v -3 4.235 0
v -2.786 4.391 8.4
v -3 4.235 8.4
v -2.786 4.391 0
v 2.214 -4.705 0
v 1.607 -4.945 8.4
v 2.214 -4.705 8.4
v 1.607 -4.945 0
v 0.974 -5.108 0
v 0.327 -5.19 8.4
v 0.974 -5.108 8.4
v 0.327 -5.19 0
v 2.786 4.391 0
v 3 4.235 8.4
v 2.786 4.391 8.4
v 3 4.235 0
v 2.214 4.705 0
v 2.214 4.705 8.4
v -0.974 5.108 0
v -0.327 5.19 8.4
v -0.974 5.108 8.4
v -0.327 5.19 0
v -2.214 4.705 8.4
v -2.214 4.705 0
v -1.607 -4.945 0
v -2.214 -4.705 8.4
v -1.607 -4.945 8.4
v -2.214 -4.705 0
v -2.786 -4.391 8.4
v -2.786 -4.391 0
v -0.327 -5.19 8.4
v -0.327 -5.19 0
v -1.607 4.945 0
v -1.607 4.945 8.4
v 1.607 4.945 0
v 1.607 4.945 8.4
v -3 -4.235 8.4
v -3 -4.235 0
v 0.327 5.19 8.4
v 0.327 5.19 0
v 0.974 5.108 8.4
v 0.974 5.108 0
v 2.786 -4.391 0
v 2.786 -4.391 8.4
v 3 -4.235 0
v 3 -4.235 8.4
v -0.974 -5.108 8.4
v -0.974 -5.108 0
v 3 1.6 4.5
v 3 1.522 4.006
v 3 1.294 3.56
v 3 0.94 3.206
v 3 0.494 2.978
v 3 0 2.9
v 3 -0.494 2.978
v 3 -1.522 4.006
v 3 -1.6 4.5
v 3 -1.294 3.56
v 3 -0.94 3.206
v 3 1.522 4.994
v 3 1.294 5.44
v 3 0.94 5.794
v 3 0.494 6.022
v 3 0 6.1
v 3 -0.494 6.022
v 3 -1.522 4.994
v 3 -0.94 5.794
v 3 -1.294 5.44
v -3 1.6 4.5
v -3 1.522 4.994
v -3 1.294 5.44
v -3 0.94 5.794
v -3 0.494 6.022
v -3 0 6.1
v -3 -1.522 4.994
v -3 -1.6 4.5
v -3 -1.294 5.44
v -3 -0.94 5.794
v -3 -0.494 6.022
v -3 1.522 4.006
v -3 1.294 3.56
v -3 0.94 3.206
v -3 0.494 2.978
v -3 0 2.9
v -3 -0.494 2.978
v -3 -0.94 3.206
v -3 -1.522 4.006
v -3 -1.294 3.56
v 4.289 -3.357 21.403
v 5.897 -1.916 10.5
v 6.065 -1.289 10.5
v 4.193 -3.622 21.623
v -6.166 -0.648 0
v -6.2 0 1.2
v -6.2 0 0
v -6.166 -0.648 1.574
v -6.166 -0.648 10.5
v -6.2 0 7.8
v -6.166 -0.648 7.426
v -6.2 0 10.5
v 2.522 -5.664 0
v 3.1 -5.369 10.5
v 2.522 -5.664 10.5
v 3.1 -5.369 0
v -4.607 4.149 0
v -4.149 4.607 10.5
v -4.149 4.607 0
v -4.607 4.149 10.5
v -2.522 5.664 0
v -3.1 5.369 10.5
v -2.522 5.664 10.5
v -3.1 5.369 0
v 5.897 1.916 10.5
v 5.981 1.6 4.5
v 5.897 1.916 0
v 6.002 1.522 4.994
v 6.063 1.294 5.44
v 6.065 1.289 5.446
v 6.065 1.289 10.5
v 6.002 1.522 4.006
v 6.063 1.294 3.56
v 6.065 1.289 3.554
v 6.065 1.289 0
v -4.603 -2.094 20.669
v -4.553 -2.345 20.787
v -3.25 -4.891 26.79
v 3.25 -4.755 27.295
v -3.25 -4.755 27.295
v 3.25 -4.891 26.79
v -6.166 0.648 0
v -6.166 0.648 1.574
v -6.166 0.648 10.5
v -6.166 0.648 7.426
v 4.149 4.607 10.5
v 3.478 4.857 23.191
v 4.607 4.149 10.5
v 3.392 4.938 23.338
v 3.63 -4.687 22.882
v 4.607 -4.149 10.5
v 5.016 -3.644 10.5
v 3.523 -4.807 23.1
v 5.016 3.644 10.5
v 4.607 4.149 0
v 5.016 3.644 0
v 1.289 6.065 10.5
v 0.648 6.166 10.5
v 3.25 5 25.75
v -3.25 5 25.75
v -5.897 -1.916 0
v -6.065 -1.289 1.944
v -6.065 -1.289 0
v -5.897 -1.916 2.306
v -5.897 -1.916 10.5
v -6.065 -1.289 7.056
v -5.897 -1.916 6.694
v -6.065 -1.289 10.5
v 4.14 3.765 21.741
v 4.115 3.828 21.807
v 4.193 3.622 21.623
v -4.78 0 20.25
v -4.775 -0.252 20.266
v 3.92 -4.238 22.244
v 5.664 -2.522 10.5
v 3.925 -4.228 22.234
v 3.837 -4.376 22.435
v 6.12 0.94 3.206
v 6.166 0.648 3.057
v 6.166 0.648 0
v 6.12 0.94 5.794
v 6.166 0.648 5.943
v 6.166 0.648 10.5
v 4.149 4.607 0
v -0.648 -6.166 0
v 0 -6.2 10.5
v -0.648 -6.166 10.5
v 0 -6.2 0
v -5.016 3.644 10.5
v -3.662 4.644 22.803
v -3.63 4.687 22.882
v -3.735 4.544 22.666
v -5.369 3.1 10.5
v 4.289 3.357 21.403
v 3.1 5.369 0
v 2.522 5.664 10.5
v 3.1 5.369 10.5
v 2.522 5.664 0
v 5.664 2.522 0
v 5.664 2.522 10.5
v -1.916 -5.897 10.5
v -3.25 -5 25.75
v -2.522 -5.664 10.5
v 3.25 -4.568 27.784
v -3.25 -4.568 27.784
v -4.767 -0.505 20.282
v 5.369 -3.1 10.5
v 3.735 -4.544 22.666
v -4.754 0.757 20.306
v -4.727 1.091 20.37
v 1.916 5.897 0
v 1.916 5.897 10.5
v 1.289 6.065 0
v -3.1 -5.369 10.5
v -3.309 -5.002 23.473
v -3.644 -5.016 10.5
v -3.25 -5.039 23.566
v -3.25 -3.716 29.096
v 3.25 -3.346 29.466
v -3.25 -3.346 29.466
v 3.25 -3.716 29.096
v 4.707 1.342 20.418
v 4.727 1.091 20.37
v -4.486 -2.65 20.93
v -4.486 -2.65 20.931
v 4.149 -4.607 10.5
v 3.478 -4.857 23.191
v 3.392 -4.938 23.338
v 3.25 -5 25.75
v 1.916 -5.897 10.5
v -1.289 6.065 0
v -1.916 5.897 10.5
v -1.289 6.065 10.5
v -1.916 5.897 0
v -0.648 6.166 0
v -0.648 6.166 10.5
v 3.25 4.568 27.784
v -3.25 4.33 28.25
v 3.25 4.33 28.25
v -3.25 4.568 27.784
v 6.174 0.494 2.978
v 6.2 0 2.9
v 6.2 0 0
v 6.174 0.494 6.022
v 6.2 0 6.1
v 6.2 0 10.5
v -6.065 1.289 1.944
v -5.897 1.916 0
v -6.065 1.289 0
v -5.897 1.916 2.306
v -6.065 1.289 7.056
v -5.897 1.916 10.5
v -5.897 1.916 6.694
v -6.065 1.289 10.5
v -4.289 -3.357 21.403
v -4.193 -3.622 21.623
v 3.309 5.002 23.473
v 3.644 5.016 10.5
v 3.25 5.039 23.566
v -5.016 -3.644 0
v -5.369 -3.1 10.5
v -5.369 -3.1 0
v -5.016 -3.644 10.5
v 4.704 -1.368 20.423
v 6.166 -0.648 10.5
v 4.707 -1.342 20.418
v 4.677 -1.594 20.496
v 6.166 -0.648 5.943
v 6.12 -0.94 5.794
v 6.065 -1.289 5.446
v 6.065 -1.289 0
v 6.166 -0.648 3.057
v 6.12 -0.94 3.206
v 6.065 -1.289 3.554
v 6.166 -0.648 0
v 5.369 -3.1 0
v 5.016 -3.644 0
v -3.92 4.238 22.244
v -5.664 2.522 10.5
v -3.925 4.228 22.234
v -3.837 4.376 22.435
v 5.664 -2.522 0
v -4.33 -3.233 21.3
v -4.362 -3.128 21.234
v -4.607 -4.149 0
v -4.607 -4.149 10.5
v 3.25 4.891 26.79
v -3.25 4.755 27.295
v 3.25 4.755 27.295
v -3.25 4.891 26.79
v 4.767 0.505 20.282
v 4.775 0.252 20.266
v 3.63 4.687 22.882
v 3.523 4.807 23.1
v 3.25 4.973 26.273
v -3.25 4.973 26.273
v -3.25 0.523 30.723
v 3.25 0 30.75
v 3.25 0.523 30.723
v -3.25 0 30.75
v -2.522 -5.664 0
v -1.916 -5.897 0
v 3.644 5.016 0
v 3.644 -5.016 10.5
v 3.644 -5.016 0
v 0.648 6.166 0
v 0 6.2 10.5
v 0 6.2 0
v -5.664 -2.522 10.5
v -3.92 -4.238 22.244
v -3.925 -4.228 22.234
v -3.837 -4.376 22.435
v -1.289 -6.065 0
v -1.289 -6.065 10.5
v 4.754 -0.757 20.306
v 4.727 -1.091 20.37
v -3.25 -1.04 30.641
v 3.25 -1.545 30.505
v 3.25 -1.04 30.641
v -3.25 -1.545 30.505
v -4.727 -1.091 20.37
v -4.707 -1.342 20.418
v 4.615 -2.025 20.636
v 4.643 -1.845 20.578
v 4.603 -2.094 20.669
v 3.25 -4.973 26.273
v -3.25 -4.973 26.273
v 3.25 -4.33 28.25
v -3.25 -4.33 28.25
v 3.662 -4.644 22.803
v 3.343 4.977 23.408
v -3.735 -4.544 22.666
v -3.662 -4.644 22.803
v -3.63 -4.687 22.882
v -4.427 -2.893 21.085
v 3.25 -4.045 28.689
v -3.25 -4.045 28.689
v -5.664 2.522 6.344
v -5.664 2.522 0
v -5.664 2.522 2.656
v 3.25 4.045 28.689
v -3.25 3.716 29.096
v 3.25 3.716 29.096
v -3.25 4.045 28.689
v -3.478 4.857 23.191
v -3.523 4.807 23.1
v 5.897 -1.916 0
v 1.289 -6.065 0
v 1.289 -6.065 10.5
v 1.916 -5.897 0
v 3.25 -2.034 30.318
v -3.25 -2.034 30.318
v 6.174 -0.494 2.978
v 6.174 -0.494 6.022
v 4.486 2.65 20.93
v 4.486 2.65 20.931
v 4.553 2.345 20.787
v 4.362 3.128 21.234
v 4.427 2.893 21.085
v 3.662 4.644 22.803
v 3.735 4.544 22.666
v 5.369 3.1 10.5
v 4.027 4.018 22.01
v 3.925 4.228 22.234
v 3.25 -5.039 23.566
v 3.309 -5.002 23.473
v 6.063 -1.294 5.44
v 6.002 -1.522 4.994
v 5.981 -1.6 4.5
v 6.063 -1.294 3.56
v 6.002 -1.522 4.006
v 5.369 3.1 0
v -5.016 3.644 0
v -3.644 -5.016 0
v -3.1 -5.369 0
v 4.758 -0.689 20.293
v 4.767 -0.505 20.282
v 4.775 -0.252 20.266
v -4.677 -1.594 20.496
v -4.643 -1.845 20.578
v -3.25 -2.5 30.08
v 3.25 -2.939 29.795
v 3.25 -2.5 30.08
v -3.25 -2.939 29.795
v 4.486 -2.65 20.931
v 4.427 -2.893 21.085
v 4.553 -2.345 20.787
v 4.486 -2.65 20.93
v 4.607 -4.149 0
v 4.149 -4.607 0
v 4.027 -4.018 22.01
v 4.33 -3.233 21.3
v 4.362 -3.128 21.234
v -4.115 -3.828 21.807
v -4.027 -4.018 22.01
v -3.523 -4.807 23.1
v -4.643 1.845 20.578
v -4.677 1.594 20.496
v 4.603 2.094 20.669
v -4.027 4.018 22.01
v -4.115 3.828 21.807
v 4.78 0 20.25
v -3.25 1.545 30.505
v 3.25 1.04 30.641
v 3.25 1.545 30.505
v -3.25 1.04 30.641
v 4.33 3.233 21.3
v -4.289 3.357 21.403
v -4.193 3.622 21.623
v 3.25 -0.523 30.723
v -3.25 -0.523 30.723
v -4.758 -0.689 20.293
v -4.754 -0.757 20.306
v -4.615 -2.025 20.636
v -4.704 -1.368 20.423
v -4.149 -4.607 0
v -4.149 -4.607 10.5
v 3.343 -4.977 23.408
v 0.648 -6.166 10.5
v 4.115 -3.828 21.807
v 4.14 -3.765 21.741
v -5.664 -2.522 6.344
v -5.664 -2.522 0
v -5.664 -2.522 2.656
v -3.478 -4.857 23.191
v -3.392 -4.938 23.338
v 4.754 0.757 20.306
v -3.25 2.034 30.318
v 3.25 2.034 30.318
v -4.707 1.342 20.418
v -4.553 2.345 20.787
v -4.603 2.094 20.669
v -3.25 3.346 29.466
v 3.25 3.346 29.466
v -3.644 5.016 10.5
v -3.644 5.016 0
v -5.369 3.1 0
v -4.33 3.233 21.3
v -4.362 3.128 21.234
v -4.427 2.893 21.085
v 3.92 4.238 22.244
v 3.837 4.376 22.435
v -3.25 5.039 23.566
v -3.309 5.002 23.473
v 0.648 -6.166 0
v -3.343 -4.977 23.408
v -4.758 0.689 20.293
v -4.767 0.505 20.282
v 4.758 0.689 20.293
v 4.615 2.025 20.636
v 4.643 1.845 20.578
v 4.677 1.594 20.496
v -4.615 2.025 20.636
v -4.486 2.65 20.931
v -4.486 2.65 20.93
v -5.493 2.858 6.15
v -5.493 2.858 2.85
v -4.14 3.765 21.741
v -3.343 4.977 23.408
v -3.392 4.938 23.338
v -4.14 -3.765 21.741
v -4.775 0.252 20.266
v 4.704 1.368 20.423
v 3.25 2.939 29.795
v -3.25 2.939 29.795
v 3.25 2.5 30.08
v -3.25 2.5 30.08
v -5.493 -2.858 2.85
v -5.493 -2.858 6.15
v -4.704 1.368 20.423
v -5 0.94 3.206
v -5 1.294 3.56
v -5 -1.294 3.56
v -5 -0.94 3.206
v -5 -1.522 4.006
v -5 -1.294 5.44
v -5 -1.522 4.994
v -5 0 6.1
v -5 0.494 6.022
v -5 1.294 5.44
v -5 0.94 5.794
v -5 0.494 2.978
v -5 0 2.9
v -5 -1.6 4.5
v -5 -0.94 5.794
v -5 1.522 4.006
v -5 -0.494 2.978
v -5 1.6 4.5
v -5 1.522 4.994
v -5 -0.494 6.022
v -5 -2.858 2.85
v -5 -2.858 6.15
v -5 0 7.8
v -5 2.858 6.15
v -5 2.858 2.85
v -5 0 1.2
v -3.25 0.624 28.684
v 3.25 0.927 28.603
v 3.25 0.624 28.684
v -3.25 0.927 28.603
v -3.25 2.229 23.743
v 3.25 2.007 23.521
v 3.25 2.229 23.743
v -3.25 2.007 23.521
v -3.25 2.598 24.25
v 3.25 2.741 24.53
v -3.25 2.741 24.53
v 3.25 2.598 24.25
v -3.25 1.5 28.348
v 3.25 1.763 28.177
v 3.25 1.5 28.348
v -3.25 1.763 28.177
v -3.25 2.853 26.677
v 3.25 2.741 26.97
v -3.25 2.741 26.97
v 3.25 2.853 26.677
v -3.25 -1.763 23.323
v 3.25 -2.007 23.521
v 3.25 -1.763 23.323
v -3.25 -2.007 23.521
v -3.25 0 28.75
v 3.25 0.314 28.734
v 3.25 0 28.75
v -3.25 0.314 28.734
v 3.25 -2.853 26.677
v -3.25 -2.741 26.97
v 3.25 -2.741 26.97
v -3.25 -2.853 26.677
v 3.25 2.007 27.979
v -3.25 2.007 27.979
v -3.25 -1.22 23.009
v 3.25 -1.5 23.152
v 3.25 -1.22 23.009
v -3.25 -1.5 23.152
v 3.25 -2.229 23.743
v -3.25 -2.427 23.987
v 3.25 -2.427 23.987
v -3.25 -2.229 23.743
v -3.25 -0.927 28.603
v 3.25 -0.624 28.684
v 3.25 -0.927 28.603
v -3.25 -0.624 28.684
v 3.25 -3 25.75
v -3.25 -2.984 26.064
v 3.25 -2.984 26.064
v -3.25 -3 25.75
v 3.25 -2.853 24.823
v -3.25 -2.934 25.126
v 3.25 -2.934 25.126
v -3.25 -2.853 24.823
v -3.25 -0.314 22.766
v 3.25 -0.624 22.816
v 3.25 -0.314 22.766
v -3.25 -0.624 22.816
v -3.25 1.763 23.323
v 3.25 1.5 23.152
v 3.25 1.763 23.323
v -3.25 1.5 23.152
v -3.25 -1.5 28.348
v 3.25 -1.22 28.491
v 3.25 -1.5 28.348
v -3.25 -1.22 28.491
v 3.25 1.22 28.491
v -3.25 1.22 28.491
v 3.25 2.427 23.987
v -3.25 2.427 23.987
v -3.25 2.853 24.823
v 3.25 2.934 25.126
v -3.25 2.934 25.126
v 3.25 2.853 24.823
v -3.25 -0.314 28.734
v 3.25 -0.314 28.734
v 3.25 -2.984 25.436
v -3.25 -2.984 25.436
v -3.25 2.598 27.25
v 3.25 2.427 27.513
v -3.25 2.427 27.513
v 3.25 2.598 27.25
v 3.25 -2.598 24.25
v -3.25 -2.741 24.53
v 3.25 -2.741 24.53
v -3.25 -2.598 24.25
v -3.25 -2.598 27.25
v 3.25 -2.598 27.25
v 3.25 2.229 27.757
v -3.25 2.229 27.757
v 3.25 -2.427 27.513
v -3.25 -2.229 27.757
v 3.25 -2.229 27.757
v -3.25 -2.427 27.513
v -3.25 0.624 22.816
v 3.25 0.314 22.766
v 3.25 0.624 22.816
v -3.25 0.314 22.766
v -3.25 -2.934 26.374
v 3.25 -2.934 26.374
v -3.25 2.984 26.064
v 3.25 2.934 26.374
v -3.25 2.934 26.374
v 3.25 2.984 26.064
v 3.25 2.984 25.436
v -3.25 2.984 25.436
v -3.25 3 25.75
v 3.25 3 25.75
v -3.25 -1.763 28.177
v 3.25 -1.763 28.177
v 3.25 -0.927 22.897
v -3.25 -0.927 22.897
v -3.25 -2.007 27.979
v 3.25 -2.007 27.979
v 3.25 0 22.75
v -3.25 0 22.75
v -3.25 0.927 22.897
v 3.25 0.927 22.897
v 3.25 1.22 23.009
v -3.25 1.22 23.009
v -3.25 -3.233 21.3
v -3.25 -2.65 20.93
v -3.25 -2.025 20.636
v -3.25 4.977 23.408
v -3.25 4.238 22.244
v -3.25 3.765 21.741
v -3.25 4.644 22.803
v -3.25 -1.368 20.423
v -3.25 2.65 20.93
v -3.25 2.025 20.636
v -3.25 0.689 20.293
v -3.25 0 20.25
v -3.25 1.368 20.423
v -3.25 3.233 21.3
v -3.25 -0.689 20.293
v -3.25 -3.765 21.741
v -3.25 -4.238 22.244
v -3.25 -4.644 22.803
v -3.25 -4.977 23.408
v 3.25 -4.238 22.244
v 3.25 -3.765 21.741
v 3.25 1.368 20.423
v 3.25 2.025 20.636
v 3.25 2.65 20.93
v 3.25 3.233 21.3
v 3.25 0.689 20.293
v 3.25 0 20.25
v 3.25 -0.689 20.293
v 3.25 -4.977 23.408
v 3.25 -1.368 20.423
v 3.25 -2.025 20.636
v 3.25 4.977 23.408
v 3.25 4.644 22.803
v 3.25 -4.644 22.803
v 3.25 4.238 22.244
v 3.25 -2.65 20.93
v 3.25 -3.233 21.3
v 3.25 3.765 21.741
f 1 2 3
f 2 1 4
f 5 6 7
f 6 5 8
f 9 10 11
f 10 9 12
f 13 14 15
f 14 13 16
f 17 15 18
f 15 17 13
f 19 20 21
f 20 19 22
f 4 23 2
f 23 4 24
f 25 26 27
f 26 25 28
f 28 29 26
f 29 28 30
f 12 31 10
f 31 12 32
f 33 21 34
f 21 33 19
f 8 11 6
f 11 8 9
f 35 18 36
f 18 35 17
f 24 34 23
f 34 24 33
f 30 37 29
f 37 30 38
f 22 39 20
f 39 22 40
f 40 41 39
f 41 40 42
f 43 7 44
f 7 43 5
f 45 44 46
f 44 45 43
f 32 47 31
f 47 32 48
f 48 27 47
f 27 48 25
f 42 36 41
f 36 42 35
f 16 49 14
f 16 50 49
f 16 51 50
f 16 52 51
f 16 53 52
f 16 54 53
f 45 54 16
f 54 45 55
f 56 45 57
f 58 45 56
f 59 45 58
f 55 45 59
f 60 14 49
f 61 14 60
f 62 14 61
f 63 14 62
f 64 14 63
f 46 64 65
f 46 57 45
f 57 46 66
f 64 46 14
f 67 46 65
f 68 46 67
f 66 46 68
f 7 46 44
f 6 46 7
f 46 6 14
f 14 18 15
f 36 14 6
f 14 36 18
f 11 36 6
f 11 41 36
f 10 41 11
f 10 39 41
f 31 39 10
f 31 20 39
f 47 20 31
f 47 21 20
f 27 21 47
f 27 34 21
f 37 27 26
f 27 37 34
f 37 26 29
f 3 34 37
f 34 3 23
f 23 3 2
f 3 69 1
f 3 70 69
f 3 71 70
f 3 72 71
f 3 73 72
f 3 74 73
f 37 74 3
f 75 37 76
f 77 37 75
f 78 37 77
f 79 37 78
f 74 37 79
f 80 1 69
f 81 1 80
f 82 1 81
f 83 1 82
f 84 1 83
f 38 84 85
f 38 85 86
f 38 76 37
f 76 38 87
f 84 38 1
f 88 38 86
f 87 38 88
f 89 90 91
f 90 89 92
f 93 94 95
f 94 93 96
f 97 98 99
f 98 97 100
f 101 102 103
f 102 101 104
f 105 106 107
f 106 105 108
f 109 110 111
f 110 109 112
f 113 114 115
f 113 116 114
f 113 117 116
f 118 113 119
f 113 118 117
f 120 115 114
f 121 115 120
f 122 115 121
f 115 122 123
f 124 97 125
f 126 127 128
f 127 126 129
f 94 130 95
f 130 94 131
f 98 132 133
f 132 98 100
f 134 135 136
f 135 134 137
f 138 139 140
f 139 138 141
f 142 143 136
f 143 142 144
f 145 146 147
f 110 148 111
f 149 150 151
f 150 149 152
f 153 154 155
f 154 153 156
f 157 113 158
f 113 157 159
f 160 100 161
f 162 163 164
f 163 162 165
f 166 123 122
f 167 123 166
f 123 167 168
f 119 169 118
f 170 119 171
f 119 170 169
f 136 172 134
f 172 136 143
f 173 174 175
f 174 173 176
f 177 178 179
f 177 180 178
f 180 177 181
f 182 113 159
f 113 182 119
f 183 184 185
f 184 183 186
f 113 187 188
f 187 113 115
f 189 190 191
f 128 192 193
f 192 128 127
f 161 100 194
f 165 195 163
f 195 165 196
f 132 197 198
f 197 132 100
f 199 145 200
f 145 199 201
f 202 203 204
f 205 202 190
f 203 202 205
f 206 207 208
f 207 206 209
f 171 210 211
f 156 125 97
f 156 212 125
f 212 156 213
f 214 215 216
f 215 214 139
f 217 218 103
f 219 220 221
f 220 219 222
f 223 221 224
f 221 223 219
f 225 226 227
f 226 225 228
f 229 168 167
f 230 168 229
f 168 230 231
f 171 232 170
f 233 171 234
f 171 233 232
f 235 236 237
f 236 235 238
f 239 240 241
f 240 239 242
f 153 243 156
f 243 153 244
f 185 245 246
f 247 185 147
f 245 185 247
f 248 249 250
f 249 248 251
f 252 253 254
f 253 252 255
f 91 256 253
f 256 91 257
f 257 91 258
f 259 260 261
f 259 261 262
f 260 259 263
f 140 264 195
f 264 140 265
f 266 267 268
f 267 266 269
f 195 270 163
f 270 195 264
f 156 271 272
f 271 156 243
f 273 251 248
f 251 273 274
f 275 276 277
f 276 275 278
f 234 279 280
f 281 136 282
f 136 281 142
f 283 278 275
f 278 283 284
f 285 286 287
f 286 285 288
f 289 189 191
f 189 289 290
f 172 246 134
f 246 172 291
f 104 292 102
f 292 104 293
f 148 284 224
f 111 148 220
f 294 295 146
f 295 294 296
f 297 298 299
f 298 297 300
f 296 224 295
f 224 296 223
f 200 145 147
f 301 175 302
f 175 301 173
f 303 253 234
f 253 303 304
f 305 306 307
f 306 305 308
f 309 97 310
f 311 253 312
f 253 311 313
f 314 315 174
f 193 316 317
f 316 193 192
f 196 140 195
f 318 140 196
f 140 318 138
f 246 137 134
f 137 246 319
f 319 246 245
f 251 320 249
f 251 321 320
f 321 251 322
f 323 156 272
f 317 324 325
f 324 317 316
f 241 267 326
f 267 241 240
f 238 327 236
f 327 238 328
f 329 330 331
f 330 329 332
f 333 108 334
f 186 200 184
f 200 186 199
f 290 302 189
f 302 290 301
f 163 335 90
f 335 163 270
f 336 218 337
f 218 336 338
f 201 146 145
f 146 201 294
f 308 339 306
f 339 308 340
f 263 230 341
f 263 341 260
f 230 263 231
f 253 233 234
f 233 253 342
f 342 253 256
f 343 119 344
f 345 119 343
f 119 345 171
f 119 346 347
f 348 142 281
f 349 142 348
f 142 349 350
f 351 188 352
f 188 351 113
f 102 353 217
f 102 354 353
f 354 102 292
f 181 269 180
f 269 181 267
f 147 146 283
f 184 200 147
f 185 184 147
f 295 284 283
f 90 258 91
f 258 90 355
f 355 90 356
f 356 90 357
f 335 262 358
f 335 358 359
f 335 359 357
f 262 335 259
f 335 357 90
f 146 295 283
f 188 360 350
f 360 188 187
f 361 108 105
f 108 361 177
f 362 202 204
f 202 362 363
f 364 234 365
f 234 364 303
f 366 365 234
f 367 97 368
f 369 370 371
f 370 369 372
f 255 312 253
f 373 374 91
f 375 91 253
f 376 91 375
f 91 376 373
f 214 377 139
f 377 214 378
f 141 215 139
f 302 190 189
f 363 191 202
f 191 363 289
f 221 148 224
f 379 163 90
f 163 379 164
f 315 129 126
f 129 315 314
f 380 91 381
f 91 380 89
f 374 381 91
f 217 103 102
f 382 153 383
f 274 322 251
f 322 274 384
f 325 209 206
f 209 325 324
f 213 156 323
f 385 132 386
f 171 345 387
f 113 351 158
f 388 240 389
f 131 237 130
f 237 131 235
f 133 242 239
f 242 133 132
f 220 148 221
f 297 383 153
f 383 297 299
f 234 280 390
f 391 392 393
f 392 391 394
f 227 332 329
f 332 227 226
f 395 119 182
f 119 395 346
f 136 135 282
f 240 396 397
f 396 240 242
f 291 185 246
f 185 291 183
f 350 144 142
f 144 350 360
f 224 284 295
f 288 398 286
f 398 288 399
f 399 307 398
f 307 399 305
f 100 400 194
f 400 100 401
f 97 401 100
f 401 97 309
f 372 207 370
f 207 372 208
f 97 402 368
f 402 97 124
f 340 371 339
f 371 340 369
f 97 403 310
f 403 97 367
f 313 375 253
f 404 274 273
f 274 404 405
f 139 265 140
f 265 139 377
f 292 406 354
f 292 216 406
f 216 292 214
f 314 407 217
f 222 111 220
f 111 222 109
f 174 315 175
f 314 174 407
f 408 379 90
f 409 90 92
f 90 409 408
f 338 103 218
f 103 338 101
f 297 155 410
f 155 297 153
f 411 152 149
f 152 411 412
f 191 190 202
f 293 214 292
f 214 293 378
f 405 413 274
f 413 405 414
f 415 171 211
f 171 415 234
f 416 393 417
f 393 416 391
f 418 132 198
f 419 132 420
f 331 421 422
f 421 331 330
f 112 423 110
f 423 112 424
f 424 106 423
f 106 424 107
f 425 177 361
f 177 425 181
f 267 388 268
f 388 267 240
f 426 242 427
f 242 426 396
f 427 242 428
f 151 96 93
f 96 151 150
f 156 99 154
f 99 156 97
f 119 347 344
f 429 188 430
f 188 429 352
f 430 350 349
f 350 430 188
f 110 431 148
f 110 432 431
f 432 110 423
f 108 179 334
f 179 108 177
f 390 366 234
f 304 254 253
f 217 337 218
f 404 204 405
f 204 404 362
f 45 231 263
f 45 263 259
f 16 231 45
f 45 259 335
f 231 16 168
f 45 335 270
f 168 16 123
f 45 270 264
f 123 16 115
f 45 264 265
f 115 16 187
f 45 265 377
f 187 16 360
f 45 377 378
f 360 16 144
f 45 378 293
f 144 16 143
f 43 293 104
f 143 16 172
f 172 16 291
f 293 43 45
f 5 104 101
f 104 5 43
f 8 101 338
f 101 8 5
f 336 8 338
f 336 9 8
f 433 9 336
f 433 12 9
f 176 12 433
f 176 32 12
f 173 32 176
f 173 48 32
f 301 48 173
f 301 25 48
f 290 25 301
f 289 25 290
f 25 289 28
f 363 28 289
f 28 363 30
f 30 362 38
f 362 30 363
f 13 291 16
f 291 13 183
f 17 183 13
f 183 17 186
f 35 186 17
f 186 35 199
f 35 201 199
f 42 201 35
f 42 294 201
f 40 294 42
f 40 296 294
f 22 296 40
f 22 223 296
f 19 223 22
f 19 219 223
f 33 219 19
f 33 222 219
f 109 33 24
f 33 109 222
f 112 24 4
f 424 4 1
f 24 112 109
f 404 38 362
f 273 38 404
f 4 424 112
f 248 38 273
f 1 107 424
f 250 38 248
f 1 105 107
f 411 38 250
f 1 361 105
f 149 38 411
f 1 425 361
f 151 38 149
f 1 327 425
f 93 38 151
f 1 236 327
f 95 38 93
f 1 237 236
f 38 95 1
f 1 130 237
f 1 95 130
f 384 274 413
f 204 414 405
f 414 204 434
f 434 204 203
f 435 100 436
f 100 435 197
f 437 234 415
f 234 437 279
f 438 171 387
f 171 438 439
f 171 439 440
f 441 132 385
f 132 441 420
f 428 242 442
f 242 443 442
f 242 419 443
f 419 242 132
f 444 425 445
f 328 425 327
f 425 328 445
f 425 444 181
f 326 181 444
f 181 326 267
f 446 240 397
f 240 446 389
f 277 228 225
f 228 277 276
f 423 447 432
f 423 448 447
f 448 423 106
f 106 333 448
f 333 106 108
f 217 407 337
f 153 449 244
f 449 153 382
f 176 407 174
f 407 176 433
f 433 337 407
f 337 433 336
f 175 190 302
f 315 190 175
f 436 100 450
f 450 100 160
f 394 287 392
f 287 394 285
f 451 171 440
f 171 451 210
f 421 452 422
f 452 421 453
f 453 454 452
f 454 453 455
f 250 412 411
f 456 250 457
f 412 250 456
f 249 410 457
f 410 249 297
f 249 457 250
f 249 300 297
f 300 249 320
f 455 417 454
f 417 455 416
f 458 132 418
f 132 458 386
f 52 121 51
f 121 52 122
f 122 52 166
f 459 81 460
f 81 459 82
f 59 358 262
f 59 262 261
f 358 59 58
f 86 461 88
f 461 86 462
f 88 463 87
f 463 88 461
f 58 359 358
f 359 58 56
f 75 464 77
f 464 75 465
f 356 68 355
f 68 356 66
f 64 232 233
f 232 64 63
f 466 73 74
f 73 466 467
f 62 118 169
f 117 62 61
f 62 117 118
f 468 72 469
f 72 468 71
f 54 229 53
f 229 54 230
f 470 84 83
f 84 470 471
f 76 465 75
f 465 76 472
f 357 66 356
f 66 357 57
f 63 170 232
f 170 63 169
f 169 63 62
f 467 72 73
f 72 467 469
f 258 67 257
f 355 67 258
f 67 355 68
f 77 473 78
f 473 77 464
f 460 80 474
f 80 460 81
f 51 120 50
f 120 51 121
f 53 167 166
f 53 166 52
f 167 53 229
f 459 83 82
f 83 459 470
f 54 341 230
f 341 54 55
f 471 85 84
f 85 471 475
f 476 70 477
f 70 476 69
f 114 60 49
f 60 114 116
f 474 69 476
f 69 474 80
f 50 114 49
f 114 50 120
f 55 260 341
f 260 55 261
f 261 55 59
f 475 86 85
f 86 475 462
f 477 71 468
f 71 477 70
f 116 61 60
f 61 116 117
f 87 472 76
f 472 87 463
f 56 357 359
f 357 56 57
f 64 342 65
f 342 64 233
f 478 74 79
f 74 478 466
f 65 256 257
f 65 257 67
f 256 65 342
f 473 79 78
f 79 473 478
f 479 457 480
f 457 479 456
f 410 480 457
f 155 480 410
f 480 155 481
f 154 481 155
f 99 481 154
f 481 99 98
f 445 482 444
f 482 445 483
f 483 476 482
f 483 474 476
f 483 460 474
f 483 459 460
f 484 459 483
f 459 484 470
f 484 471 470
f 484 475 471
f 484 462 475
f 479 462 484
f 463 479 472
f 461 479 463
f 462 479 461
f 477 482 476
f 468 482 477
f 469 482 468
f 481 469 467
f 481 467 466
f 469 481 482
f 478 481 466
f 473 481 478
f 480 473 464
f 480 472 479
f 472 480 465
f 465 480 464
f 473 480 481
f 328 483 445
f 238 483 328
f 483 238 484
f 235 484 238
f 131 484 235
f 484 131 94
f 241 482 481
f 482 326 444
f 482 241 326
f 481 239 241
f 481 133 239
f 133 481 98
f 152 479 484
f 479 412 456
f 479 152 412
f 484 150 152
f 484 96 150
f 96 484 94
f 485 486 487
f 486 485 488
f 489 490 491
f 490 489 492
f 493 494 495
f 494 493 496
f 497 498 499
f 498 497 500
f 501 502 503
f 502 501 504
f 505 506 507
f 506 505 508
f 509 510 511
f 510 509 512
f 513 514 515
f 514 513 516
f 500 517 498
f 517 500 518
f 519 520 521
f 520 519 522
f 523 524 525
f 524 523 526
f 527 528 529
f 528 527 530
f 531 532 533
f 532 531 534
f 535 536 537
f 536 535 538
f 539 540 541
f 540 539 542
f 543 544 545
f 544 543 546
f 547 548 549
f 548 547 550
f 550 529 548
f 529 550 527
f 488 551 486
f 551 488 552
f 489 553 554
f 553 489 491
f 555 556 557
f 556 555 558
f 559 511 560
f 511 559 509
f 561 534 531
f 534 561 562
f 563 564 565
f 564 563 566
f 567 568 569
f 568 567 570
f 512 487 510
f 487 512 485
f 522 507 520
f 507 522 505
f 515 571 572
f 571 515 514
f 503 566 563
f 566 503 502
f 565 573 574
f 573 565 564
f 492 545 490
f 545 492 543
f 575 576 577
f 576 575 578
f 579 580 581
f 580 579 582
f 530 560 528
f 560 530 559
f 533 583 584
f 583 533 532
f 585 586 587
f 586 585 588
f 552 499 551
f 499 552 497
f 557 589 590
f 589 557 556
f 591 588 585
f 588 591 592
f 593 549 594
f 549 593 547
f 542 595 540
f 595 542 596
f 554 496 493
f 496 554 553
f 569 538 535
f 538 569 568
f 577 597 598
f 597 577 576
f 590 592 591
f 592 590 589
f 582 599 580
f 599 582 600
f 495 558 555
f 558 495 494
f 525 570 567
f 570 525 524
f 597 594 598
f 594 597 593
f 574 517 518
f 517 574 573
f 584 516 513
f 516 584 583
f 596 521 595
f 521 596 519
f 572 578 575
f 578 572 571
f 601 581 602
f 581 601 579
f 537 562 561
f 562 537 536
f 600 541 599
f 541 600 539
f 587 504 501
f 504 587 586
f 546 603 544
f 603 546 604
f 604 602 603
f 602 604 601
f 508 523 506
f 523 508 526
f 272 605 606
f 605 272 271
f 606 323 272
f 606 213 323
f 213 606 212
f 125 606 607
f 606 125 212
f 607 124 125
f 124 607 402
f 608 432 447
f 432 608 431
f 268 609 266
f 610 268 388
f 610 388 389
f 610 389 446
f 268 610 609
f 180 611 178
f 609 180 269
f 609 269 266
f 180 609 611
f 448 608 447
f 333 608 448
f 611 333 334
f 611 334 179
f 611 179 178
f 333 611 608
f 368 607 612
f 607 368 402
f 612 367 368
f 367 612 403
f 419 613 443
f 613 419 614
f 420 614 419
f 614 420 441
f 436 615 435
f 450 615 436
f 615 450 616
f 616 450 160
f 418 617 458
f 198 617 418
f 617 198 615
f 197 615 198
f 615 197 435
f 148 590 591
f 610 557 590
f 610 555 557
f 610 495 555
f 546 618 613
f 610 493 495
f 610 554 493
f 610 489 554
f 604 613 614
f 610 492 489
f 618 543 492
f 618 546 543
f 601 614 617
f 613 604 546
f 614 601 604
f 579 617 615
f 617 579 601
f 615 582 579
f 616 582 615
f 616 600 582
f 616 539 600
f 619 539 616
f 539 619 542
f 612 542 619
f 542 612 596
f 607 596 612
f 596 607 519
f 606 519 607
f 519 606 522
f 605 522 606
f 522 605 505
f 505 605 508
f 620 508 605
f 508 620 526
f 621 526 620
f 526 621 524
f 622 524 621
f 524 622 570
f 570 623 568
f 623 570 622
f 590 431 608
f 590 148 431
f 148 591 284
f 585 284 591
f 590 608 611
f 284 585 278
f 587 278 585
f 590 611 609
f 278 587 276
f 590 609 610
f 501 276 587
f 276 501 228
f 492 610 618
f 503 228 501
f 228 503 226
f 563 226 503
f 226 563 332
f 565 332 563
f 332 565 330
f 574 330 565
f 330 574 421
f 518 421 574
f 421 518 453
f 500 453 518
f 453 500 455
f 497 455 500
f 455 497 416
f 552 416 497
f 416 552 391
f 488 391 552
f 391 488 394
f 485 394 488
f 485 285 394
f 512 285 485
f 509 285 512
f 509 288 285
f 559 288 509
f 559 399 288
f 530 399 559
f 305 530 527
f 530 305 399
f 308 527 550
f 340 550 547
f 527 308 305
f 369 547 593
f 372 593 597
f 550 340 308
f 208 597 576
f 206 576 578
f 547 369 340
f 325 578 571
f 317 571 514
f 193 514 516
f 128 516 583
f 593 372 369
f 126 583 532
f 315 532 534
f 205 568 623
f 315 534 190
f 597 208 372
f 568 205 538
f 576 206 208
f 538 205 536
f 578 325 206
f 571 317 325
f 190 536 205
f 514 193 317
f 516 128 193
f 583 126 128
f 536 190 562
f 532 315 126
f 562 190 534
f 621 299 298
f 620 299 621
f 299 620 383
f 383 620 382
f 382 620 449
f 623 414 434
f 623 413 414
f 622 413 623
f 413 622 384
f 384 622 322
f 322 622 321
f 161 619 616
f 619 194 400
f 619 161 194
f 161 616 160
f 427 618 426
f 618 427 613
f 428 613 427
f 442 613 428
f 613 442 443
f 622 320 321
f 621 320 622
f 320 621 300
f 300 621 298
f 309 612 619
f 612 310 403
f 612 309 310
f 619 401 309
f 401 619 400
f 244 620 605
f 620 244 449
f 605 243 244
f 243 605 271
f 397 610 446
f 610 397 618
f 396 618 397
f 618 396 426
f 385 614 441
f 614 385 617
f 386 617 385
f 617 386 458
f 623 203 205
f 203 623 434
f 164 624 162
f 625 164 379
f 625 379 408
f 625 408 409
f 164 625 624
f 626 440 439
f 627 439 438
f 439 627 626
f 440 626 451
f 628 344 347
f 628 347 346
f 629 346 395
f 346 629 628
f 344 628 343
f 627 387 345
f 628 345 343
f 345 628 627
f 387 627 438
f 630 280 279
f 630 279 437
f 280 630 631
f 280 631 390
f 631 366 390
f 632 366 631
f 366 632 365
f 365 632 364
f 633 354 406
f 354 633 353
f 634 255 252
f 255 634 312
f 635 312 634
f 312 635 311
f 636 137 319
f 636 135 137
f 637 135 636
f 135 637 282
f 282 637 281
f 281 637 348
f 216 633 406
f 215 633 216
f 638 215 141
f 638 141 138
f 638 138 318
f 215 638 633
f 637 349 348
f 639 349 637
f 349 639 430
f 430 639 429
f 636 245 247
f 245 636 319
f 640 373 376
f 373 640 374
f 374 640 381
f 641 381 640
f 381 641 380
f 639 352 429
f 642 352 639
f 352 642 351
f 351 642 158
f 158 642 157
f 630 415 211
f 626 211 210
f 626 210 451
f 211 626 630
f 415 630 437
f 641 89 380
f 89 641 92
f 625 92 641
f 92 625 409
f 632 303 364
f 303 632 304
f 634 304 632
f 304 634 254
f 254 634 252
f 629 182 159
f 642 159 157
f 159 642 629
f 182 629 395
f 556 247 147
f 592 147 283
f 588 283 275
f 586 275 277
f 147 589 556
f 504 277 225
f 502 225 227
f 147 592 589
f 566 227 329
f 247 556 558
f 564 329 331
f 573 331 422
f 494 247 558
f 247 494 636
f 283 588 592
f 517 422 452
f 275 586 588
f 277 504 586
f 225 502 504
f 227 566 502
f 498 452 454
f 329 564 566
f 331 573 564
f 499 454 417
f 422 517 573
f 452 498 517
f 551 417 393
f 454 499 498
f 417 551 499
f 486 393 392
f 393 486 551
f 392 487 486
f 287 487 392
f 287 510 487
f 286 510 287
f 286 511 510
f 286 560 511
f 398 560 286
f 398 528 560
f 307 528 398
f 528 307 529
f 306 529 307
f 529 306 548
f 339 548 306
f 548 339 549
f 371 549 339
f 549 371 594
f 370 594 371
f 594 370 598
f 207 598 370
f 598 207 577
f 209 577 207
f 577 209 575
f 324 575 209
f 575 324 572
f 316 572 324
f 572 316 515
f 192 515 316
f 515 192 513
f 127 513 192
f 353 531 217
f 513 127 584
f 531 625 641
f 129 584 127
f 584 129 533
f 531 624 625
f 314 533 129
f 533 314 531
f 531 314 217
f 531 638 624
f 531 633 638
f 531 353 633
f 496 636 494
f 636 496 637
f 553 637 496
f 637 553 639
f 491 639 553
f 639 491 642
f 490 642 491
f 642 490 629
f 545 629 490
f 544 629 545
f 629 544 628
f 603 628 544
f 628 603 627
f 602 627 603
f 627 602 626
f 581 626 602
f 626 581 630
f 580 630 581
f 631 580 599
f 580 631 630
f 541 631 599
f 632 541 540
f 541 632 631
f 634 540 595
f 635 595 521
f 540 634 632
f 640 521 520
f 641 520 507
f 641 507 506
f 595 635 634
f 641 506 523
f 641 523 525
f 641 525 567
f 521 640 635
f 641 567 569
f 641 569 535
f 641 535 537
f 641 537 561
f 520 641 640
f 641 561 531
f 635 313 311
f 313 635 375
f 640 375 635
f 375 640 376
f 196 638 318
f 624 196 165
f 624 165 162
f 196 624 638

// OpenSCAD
// file: lib/igus.scad
include <../../parameters.scad>


module efsm_04(){
    import("../../STL/external/igus/EFSM_04.stl", convexity = 5);
}
module efsm_05(){
    import("../../STL/external/igus/EFSM_05.stl", convexity = 5);
}
module efsm_06(){
    import("../../STL/external/igus/EFSM_06.stl", convexity = 5);
}
module efsm_08(){
    import("../../STL/external/igus/EFSM_08.stl", convexity = 5);
}
module efsm_10(){
    import("../../STL/external/igus/EFSM_10.stl", convexity = 5);
}
module efsm_12(){
    import("../../STL/external/igus/EFSM_12.stl", convexity = 5);
}





module kstm_05(){
    import("../../STL/external/igus/KSTM_05_1.stl", convexity = 5);
}
module kstm_06(){
    import("../../STL/external/igus/KSTM_06_2.stl", convexity = 5);
}
module kstm_08(){
    import("../../STL/external/igus/KSTM_08_3.stl", convexity = 5);
}
module kstm_10(){
    import("../../STL/external/igus/KSTM_10_4.stl", convexity = 5);
}


data_kstm_ball_height = [[5,7],[6,10],[8,10],[10,14]];
function kstm_ball_height(type) = data_kstm_ball_height[search(type, data_kstm_ball_height)[0]][1];

data_kstm_flange_holes_distance = [[5,25], [6,33], [8,33], [10,46], [12,46]];
function kstm_flange_holes_distance(type) = data_kstm_flange_holes_distance[search(type, data_kstm_flange_holes_distance)[0]][1];

data_kstm_flange_length = [[5,34], [6,43], [8,47], [10,62], [12,65]];
function kstm_flange_length(type) = data_kstm_flange_length[search(type, data_kstm_flange_length)[0]][1];

data_kstm_flange_thickness = [[5,6], [6,7], [8,9], [10,10.5], [12,12]];
function kstm_flange_width(type) = data_kstm_flange_thickness[search(type, data_kstm_flange_thickness)[0]][1];

data_kstm_ball_thickness = [[5,25], [6,33], [8,33], [10,46], [12,46]];
function kstm_ball_thickness(type) = data_kstm_ball_thickness[search(type, data_kstm_ball_thickness)[0]][1];

module kbrm_02() {
    import("../../STL/external/igus/KBRM_02_1.stl", convexity = 5);
}
module kbrm_03() {
    import("../../STL/external/igus/KBRM_03_1.stl", convexity = 5);
}
module kbrm_05() {
    import("../../STL/external/igus/KBRM_05_2.stl", convexity = 5);
}
module kbrm_06(){
    import("../../STL/external/igus/KBRM_06_2.stl", convexity = 5);
}
module kbrm_08(){
    import("../../STL/external/igus/KBRM_08_1.stl", convexity = 5);
}



distance = 50;

translate([0, 0*distance,  kstm_ball_height(5)]) kstm_05();
translate([0, 1*distance, kstm_ball_height(6)]) kstm_06();
translate([0, 2*distance, kstm_ball_height(8)]) kstm_08();
translate([0, 3*distance, kstm_ball_height(10)]) kstm_10();


translate([80, 0*distance, 0]) efsm_04();
translate([80, 1*distance, 0]) efsm_05();
translate([80, 2*distance, 0]) efsm_06();
translate([80, 3*distance, 0]) efsm_08();
translate([80, 4*distance, 0]) efsm_10();
translate([80, 5*distance, 0]) efsm_12();


translate([160, 0*distance, 0]) kbrm_02();
translate([160, 1*distance, 0]) kbrm_03();
translate([160, 2*distance, 0]) kbrm_05();
translate([160, 3*distance, 0]) kbrm_06();
translate([160, 4*distance, 0]) kbrm_08();
// main file
//========== DRŽÁK PÍSTU ==========//

include <../parameters.scad>
use <lib/igus.scad>



wall_thickness = 888_2025_wall_thickness;
height = 888_2025_height;
//piston_position je udavana v procentech (0 - 100)
module 888_2025(piston=false, piston_position = 0) {

    //translate([RT57208M25_EW/-2-wall_thickness+(KBRM03_B/2+chasis_fork_thickness-888_2025_distance_space+2+RT57208M25_EW/2), 0, -(RT57208M25_MR+RT57208M25_LB+wall_thickness+M6_screw_diameter/2+wall_thickness+height)]) {
    //translate([chasis_fork_thickness/2 + KBRM03_B/2+1, 0, -(RT57208M25_MR+RT57208M25_LB+wall_thickness+M6_screw_diameter/2+wall_thickness+height)]){
    if(piston) {
        translate([0, 0, -RT57208M25_XC+RT57208M25_LB+RT57208M25_WF])
            cylinder(d=RT57208M25_D, h=RT57208M25_XC-RT57208M25_LB-RT57208M25_WF, $fn=50);

        translate([0, 0, -RT57208M25_XC+RT57208M25_LB])
            cylinder(d=RT57208M25_BE, h=RT57208M25_WF, $fn=50);

        translate([0, 0, -RT57208M25_XC+RT57208M25_LB-RT57208M25_stroke*piston_position/100]) {
            cylinder(d=RT57208M25_MMh9, h=RT57208M25_stroke, $fn=50);

            translate([0, 0, -RT57208M25_A])
                cylinder(d=RT57208M25_KK, h=RT57208M25_A, $fn=50);
        }

        translate([0, 0, -KBRM03_h1+KBRM03_l1-RT57208M25_XC+RT57208M25_LB-RT57208M25_stroke*piston_position/100-RT57208M25_A])
            rotate([180, 0, 90])
                kbrm_03();

    }

    difference() {
        hull() {
            cylinder(d=RT57208M25_BE+wall_thickness, h=RT57208M25_MR+RT57208M25_LB+wall_thickness, $fn=60);

            //translate([-chassis_fork_thickness/2 - KBRM03_B/2 , 0, 0])
            translate([0, 0, RT57208M25_MR+RT57208M25_LB+wall_thickness+M6_screw_diameter/2+wall_thickness+height])
                rotate([0, -90, 0])
                    cylinder(d=sliding_insert_metal_diameter+wall_thickness*2, h=sliding_insert_metal_width-888_2025_sliding_insert_overlap*2, $fn=60, center=true);
        }

        //otvor pro píst
        translate([0, 0, -0.1])
            intersection() {
                cylinder(d=RT57208M25_BE, h=RT57208M25_MR+RT57208M25_LB+0.1, $fn=50);

                translate([RT57208M25_EW/-2, RT57208M25_BE/-2, 0])
                    cube([RT57208M25_EW, RT57208M25_BE, RT57208M25_MR+RT57208M25_LB]);
            }

        //šroub pro přišroubování k pístu
        translate([0, 0, RT57208M25_LB])
            rotate([0, 90, 0])
                cylinder(d=M3_screw_diameter, h=100, $fn=20, center=true);
        translate([-RT57208M25_EW/2-2, 0, RT57208M25_LB])
            rotate([0, -90, 0])
                cylinder(d=M3_nut_diameter, h=10, $fn=6);

        //šroub pro připevnění k 888_2024
        translate([0, 0, RT57208M25_MR+RT57208M25_LB+wall_thickness+M6_screw_diameter/2+wall_thickness+height])
                rotate([0, -90, 0])
                    cylinder(d=sliding_insert_metal_diameter, h=100, $fn=60, center=true);

        //plocha pro podložky
        translate([-sliding_insert_metal_width/2+888_2025_sliding_insert_overlap, 0, RT57208M25_MR+RT57208M25_LB+wall_thickness+M6_screw_diameter/2+wall_thickness+height])
            rotate([0, -90, 0])
                cylinder(d=888_2025_washer_diameter+1, h=50, $fn=50);
        translate([sliding_insert_metal_width/2-888_2025_sliding_insert_overlap, 0, RT57208M25_MR+RT57208M25_LB+wall_thickness+M6_screw_diameter/2+wall_thickness+height])
            rotate([0, 90, 0])
                cylinder(d=888_2025_washer_diameter+1, h=50, $fn=50);
    }

    //}
}

888_2025();
